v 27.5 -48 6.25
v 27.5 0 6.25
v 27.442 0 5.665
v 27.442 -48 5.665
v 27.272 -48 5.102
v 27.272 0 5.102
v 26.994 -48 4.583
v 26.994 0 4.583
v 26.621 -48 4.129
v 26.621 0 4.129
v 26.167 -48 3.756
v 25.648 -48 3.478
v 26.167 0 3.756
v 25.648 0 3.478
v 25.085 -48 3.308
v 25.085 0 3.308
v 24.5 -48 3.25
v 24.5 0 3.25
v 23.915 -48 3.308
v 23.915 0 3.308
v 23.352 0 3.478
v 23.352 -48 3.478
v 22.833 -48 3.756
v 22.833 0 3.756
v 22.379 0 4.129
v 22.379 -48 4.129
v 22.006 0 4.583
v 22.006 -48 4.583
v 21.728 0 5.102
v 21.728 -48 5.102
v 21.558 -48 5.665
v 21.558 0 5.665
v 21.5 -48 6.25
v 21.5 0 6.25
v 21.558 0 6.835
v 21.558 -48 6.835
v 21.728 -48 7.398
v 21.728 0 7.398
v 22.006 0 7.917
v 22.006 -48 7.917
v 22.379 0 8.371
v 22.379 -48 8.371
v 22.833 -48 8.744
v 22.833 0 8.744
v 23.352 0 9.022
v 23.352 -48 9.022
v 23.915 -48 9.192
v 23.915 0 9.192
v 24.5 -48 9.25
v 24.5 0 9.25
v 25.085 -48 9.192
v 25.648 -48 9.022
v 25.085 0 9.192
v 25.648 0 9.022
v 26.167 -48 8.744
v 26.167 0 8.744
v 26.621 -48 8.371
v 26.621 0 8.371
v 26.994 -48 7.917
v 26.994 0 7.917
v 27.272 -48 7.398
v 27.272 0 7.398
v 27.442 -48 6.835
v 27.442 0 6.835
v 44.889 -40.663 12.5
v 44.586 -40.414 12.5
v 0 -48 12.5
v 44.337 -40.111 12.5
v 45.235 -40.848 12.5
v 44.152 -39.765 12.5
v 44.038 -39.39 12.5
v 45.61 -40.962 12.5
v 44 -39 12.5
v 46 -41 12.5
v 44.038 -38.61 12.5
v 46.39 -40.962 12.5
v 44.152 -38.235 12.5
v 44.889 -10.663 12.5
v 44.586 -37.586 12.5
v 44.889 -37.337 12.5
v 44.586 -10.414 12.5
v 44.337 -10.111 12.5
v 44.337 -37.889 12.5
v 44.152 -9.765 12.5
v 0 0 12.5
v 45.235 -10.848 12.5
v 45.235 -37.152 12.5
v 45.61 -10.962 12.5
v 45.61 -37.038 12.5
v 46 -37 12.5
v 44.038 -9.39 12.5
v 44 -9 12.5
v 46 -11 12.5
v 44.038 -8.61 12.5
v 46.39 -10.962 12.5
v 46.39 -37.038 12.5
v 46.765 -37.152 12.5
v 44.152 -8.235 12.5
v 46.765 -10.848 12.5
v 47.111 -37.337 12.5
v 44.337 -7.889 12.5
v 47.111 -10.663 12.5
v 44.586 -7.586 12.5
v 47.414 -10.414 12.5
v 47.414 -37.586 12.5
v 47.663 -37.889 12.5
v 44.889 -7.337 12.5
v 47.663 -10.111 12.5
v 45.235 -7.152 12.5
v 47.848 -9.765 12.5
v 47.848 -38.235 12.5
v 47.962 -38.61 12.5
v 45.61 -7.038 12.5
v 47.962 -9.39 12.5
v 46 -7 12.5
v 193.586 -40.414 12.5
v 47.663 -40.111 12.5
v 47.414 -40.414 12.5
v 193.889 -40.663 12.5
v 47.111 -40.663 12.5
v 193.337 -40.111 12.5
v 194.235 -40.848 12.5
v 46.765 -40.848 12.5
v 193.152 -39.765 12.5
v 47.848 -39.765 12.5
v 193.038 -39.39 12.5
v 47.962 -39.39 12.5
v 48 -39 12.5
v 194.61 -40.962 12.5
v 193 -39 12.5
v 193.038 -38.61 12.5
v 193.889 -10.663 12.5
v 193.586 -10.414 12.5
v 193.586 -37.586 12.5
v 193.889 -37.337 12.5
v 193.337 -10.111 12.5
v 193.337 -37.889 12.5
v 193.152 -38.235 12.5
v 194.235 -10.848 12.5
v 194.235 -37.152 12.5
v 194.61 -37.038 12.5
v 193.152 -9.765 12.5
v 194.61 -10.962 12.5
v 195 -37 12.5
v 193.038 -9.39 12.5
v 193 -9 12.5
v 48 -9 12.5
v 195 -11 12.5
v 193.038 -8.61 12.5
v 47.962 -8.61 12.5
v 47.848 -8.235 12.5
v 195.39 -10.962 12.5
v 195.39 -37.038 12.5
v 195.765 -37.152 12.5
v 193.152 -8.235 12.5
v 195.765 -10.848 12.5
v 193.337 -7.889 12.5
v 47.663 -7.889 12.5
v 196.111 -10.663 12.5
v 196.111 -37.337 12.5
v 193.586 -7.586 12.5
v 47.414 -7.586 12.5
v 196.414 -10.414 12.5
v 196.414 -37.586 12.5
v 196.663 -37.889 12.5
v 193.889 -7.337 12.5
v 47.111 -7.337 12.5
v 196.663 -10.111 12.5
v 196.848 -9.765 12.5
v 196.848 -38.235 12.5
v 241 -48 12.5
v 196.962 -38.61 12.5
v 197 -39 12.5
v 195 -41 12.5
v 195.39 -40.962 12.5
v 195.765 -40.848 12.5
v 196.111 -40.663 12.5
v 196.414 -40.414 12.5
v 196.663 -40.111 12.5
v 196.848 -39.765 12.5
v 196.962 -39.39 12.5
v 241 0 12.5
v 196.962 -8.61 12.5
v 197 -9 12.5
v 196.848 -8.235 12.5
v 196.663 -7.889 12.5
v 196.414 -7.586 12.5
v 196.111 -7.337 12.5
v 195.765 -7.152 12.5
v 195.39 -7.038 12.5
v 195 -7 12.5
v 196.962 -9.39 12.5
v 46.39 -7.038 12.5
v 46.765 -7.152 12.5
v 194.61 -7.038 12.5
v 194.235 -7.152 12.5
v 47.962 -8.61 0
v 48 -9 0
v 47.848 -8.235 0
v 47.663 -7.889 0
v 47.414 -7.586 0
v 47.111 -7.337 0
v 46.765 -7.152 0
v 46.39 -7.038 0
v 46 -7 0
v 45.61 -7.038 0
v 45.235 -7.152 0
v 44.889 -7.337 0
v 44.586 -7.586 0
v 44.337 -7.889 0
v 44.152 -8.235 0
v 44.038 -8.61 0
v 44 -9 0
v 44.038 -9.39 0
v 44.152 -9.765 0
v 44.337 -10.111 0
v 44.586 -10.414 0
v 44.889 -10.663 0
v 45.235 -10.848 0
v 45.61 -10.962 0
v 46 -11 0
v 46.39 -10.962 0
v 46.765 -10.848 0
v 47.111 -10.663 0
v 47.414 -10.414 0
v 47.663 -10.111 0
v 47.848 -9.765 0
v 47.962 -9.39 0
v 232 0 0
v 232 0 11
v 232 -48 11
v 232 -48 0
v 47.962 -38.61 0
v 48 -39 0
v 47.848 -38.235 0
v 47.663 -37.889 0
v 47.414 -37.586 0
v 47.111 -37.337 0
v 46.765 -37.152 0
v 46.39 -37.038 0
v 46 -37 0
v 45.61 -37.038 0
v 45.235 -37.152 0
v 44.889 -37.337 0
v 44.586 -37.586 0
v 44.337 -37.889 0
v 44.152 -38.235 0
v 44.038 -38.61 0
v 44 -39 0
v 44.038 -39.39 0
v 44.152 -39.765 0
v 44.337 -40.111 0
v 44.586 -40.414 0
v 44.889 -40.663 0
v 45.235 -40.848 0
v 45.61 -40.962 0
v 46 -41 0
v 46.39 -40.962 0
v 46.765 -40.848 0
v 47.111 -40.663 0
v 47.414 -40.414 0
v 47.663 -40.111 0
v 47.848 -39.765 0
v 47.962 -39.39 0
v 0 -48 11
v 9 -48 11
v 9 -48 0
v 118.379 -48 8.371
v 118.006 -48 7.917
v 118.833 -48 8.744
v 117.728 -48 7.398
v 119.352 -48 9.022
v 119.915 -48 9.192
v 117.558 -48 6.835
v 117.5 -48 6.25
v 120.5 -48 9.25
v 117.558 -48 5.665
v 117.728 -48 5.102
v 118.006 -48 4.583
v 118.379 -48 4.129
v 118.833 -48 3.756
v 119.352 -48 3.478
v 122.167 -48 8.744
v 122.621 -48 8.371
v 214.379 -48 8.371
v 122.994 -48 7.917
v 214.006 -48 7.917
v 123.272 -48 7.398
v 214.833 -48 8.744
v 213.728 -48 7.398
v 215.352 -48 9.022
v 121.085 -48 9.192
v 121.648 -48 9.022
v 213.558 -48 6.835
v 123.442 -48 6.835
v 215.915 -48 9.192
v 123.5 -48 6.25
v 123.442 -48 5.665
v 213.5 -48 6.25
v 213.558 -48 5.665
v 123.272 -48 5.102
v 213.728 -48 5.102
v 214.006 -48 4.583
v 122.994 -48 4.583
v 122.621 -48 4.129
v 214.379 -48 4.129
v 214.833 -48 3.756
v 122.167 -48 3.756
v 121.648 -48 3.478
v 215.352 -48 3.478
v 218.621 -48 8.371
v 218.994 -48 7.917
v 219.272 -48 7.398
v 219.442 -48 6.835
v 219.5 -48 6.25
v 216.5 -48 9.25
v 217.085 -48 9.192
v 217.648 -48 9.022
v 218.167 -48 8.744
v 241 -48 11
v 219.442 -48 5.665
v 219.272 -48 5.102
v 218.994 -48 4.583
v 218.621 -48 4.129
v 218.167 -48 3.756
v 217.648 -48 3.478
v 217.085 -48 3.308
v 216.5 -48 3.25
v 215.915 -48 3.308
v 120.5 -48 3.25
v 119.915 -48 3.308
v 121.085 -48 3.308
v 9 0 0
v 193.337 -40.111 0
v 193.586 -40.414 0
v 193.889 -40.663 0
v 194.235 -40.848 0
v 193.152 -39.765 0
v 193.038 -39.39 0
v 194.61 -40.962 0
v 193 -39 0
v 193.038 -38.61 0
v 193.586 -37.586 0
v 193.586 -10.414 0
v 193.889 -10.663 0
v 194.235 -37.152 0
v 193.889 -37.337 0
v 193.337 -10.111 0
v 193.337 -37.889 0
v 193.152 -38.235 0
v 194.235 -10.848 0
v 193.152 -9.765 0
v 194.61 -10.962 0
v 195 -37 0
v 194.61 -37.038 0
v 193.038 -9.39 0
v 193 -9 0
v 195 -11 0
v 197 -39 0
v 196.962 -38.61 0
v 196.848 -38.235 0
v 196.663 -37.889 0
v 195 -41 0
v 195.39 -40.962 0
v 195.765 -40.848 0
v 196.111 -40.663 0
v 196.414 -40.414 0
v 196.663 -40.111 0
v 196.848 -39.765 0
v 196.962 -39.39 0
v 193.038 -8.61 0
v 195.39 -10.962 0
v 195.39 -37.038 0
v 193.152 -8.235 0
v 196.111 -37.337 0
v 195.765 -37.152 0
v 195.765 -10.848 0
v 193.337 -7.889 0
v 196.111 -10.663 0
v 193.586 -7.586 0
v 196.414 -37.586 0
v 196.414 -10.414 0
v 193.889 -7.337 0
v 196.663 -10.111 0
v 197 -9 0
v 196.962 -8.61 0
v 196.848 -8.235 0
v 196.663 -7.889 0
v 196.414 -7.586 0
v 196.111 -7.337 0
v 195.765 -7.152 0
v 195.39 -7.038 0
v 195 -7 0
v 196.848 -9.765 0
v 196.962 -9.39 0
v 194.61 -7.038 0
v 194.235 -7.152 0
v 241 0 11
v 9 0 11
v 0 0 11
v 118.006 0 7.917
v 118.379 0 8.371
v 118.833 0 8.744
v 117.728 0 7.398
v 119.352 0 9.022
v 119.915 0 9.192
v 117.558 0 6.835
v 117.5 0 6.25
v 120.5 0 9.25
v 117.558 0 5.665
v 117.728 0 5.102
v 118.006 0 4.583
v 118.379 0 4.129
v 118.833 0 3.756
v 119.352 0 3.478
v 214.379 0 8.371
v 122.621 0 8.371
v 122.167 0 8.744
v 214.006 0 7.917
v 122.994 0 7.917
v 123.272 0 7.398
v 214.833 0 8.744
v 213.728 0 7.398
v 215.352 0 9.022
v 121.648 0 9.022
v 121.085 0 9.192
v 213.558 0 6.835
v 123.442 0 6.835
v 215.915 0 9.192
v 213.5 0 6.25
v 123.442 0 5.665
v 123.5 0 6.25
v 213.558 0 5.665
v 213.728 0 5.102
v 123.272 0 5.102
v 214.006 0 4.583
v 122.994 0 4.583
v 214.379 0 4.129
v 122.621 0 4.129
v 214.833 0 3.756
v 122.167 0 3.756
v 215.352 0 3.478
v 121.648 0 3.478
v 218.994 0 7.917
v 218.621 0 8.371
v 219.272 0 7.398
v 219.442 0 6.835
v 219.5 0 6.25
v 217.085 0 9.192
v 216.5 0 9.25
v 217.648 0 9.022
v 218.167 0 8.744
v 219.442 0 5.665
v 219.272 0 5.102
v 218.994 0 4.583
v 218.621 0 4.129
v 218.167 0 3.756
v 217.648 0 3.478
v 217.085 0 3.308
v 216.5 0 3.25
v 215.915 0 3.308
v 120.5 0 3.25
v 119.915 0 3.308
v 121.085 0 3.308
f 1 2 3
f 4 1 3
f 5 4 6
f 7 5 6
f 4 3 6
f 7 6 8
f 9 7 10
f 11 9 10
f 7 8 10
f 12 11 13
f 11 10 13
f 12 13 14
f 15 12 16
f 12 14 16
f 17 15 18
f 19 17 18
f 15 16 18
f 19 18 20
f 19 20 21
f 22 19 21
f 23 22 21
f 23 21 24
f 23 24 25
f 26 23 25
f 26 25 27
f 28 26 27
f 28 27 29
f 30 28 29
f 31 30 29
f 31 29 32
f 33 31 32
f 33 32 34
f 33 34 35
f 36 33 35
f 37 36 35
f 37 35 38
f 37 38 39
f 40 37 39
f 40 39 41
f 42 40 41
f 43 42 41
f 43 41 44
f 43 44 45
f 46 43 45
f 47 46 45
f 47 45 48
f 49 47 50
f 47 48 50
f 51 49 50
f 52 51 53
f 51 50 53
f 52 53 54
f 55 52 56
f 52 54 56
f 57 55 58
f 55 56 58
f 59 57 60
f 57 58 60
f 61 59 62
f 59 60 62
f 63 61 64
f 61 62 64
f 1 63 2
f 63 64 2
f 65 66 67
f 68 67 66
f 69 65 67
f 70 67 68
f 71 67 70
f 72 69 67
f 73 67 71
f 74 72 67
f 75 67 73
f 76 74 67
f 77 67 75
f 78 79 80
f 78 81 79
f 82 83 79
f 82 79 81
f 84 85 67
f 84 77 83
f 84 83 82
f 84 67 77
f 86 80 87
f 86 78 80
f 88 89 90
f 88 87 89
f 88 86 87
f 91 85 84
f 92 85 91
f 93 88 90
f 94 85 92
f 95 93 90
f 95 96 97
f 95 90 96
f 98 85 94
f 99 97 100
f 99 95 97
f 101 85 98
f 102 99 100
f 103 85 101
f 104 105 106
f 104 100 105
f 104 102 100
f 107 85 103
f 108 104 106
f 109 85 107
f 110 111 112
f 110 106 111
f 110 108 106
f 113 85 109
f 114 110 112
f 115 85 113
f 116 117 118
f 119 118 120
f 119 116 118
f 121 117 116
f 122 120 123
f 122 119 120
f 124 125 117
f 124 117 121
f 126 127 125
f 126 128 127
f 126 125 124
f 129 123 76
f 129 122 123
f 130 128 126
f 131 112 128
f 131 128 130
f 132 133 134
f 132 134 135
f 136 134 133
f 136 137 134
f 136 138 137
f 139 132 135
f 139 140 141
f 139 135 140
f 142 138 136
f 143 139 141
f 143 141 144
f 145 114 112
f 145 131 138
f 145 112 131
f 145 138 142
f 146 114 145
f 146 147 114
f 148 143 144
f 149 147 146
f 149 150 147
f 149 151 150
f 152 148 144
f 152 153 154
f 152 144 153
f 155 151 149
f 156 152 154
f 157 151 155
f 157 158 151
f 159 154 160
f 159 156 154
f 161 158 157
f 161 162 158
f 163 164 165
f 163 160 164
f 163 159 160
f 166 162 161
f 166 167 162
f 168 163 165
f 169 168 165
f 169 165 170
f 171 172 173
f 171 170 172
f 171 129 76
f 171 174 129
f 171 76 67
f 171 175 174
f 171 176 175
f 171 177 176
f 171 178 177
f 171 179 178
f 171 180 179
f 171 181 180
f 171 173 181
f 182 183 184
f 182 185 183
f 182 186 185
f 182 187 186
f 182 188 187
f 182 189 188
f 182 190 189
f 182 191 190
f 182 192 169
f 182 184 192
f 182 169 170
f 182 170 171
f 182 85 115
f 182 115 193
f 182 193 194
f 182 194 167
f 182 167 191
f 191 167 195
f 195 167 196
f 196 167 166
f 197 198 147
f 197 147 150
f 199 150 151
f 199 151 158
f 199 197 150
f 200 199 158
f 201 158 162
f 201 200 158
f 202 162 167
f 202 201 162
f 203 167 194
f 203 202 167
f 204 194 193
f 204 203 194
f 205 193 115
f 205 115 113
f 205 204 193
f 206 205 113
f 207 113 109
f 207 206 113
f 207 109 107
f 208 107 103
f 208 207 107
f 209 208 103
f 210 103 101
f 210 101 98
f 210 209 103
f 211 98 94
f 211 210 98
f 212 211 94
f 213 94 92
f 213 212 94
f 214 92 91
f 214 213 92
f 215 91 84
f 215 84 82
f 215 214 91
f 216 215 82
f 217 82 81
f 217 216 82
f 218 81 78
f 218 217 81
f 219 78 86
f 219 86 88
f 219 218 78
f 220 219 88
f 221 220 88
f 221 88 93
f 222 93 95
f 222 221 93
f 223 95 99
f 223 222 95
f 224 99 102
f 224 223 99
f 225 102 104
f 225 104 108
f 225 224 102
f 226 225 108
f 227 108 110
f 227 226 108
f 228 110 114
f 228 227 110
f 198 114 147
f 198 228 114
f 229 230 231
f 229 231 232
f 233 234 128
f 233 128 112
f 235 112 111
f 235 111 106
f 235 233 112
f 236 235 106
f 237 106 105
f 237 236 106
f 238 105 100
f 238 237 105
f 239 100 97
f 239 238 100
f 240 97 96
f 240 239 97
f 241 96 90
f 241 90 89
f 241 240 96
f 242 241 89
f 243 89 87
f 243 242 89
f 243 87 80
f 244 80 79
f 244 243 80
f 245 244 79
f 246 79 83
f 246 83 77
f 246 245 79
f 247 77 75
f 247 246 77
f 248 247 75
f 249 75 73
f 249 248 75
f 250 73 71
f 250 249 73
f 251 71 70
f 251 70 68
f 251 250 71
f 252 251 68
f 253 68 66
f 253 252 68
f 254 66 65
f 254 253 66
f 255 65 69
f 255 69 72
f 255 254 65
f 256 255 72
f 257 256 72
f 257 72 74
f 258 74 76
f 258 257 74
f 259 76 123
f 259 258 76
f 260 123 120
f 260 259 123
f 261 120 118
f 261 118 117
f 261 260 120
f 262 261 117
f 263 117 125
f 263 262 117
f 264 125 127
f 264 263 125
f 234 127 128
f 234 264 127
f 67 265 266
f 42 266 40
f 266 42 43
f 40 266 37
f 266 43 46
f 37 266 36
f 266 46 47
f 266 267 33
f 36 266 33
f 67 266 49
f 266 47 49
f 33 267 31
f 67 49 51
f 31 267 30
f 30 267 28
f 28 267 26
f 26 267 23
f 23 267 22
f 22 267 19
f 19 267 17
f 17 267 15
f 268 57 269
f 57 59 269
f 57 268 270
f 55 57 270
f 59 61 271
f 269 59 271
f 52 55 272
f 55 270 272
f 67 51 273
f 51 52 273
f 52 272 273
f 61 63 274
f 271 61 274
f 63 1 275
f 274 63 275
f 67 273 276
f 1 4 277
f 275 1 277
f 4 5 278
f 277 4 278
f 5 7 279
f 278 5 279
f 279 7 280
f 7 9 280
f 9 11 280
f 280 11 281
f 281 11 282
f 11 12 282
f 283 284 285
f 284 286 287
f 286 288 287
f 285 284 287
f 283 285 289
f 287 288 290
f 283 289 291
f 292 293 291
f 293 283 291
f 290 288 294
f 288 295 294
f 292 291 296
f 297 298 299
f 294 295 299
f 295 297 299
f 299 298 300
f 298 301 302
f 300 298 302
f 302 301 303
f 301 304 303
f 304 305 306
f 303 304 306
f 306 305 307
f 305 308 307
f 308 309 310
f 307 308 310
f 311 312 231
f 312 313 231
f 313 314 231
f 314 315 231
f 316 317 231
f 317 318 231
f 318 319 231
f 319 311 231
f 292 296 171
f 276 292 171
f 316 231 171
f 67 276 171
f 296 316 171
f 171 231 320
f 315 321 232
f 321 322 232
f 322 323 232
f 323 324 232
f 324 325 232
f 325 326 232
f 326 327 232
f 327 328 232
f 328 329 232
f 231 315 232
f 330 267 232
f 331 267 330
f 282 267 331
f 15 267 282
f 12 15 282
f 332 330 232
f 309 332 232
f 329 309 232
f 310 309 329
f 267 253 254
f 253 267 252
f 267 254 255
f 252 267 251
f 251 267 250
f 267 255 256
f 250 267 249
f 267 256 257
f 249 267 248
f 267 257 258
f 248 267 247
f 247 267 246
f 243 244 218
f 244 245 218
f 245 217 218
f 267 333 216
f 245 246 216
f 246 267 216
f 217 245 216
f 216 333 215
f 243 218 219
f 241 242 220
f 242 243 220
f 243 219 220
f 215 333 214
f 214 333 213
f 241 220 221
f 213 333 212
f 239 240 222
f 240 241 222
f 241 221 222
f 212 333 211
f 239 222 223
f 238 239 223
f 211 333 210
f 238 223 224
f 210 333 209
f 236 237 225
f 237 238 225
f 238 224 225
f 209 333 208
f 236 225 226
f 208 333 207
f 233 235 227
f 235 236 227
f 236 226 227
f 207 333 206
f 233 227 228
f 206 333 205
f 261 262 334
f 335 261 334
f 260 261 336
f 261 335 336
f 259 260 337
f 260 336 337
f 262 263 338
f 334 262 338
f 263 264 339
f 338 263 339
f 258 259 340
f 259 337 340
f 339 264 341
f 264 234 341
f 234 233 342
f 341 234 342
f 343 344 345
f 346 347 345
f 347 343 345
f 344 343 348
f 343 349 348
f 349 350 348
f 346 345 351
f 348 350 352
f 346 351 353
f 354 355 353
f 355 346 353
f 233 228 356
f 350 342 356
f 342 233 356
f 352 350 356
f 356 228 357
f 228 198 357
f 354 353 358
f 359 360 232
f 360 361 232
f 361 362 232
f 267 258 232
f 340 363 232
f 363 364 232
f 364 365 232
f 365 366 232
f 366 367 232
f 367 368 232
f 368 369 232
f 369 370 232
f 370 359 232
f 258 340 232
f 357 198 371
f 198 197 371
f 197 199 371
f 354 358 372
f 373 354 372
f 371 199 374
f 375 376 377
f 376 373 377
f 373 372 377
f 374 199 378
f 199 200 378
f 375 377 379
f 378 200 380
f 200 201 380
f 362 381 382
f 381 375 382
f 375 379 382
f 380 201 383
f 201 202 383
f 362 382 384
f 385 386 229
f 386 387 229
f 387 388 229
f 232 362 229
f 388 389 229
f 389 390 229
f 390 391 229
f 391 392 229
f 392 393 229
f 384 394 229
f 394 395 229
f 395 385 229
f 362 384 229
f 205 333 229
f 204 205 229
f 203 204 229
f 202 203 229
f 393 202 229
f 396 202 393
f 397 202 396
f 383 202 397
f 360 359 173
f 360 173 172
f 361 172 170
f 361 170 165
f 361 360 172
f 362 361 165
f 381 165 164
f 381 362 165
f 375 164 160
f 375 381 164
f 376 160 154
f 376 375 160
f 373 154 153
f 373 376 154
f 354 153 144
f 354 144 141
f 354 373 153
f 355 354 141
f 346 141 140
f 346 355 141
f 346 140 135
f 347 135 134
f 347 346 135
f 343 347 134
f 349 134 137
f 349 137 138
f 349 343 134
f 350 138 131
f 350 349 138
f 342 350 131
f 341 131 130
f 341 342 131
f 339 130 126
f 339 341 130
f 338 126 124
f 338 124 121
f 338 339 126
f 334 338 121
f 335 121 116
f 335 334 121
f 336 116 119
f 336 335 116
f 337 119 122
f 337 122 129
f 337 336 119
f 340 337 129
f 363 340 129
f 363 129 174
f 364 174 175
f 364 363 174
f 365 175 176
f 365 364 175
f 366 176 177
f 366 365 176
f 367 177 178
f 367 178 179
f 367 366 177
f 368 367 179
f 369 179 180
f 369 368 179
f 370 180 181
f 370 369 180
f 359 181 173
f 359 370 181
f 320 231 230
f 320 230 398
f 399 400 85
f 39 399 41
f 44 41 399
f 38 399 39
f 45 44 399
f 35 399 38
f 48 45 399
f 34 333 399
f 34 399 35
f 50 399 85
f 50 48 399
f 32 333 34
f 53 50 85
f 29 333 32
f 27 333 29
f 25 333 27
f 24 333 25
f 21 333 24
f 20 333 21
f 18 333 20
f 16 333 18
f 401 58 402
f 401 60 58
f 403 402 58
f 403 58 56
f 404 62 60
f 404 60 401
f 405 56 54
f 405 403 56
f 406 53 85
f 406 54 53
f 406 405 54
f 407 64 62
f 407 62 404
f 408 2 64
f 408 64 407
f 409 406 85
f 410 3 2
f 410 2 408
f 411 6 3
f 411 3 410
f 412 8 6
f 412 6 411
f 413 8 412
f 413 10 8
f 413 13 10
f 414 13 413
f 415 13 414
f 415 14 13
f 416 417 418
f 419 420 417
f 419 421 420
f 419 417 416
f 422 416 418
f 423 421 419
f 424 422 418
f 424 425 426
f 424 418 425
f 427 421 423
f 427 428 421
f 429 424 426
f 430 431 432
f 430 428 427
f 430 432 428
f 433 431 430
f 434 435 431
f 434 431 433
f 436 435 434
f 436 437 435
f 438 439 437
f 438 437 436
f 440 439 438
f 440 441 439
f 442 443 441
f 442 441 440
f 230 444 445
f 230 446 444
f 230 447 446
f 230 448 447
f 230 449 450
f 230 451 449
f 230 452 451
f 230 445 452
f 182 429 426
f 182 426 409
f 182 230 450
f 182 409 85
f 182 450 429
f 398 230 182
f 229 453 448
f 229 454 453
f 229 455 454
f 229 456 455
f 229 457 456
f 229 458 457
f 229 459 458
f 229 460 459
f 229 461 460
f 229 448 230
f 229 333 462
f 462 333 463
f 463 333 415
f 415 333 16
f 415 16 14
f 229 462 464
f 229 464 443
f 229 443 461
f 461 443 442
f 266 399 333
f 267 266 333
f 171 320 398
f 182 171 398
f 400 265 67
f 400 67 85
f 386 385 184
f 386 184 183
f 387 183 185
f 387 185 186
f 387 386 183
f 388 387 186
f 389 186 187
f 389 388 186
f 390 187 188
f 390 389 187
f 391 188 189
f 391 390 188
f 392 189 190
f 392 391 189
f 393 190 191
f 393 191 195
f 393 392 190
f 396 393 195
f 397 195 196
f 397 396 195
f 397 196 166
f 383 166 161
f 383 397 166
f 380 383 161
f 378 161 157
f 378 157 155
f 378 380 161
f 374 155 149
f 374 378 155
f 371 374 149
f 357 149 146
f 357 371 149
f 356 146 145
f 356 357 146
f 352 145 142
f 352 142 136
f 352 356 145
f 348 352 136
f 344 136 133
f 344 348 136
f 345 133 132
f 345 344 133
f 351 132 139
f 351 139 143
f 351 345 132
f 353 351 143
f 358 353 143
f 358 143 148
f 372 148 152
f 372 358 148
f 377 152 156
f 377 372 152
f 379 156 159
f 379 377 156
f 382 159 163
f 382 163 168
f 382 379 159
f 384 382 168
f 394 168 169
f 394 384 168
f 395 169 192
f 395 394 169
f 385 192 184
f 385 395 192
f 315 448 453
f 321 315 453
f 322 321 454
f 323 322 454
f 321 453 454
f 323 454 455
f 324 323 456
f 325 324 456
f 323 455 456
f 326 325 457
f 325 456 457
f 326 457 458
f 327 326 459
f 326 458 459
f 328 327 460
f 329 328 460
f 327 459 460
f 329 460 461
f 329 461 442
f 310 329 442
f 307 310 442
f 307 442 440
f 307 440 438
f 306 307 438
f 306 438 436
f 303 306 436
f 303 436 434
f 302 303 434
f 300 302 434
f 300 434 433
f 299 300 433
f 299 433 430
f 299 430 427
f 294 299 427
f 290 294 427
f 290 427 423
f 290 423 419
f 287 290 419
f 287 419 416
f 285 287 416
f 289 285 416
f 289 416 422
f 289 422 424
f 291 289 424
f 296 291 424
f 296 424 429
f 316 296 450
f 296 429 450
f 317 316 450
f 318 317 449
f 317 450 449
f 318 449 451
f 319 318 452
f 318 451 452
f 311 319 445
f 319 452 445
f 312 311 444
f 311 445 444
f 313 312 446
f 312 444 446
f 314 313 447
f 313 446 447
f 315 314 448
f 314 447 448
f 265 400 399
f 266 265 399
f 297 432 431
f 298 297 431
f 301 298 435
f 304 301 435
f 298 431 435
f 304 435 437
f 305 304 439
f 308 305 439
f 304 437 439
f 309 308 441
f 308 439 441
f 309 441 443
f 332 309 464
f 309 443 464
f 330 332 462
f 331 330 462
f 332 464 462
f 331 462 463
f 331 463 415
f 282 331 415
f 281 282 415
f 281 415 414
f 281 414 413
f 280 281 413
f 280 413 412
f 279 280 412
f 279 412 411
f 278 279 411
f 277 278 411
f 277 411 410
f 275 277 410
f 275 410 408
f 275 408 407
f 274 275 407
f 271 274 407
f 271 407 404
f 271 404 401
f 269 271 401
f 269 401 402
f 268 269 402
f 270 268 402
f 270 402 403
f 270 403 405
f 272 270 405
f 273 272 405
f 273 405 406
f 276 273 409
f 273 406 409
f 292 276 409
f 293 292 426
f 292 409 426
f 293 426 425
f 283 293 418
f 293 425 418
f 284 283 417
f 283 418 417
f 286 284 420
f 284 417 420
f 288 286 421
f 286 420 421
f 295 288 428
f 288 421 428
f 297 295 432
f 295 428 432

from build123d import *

# Parameters (mm, degrees)
ESQUISSE1_W      = 241
ESQUISSE1_H      = 48
ESQUISSE1_R      = 2
EXTRUSION1_DEPTH = 12.5
ESQUISSE2_W      = 9
ESQUISSE2_H      = 11
EXTRUSION2_DEPTH = 49
EXTRUSION3_REACH = 50
ESQUISSE3_R      = 3


with BuildPart() as part:
    # Esquisse1 → Extrusion1 (new body)
    with BuildSketch(Plane.XY):
        with Locations((120.5, -24)):
            Rectangle(ESQUISSE1_W, ESQUISSE1_H)
        with Locations((195, -39)):
            Circle(ESQUISSE1_R, mode=Mode.SUBTRACT)
        with Locations((46, -9)):
            Circle(ESQUISSE1_R, mode=Mode.SUBTRACT)
        with Locations((46, -39)):
            Circle(ESQUISSE1_R, mode=Mode.SUBTRACT)
        with Locations((195, -9)):
            Circle(ESQUISSE1_R, mode=Mode.SUBTRACT)
    extrude(amount=EXTRUSION1_DEPTH)

    # Esquisse2 → Extrusion2 (cut, through all)
    with BuildSketch(Plane(origin=(0, 0, 0), x_dir=(1, 0, 0), z_dir=(0, 1, 0))):
        with Locations((4.5, -5.5)):
            Rectangle(ESQUISSE2_W, ESQUISSE2_H)
        with Locations((236.5, -5.5)):
            Rectangle(ESQUISSE2_W, ESQUISSE2_H)
    extrude(amount=-EXTRUSION2_DEPTH, mode=Mode.SUBTRACT)

    # Esquisse3 → Extrusion3 (cut, up to next)
    with BuildSketch(Plane(origin=(0, 0, 0), x_dir=(1, 0, 0), z_dir=(0, 1, 0)), mode=Mode.PRIVATE) as extrusion3_sk1:
        with Locations((120.5, -6.25)):
            Circle(ESQUISSE3_R)
    extrusion3_tool1 = extrude(extrusion3_sk1.sketch, amount=-EXTRUSION3_REACH, mode=Mode.PRIVATE) & part.part
    add(extrusion3_tool1.solids().sort_by_distance((120.5, 0, 6.25))[0], mode=Mode.SUBTRACT)
    # Esquisse3 → Extrusion3 (cut, up to next)
    with BuildSketch(Plane(origin=(0, 0, 0), x_dir=(1, 0, 0), z_dir=(0, 1, 0)), mode=Mode.PRIVATE) as extrusion3_sk2:
        with Locations((24.5, -6.25)):
            Circle(ESQUISSE3_R)
    extrusion3_tool2 = extrude(extrusion3_sk2.sketch, amount=-EXTRUSION3_REACH, mode=Mode.PRIVATE) & part.part
    add(extrusion3_tool2.solids().sort_by_distance((24.5, 0, 6.25))[0], mode=Mode.SUBTRACT)
    # Esquisse3 → Extrusion3 (cut, up to next)
    with BuildSketch(Plane(origin=(0, 0, 0), x_dir=(1, 0, 0), z_dir=(0, 1, 0)), mode=Mode.PRIVATE) as extrusion3_sk3:
        with Locations((216.5, -6.25)):
            Circle(ESQUISSE3_R)
    extrusion3_tool3 = extrude(extrusion3_sk3.sketch, amount=-EXTRUSION3_REACH, mode=Mode.PRIVATE) & part.part
    add(extrusion3_tool3.solids().sort_by_distance((216.5, 0, 6.25))[0], mode=Mode.SUBTRACT)


solid = part.part
